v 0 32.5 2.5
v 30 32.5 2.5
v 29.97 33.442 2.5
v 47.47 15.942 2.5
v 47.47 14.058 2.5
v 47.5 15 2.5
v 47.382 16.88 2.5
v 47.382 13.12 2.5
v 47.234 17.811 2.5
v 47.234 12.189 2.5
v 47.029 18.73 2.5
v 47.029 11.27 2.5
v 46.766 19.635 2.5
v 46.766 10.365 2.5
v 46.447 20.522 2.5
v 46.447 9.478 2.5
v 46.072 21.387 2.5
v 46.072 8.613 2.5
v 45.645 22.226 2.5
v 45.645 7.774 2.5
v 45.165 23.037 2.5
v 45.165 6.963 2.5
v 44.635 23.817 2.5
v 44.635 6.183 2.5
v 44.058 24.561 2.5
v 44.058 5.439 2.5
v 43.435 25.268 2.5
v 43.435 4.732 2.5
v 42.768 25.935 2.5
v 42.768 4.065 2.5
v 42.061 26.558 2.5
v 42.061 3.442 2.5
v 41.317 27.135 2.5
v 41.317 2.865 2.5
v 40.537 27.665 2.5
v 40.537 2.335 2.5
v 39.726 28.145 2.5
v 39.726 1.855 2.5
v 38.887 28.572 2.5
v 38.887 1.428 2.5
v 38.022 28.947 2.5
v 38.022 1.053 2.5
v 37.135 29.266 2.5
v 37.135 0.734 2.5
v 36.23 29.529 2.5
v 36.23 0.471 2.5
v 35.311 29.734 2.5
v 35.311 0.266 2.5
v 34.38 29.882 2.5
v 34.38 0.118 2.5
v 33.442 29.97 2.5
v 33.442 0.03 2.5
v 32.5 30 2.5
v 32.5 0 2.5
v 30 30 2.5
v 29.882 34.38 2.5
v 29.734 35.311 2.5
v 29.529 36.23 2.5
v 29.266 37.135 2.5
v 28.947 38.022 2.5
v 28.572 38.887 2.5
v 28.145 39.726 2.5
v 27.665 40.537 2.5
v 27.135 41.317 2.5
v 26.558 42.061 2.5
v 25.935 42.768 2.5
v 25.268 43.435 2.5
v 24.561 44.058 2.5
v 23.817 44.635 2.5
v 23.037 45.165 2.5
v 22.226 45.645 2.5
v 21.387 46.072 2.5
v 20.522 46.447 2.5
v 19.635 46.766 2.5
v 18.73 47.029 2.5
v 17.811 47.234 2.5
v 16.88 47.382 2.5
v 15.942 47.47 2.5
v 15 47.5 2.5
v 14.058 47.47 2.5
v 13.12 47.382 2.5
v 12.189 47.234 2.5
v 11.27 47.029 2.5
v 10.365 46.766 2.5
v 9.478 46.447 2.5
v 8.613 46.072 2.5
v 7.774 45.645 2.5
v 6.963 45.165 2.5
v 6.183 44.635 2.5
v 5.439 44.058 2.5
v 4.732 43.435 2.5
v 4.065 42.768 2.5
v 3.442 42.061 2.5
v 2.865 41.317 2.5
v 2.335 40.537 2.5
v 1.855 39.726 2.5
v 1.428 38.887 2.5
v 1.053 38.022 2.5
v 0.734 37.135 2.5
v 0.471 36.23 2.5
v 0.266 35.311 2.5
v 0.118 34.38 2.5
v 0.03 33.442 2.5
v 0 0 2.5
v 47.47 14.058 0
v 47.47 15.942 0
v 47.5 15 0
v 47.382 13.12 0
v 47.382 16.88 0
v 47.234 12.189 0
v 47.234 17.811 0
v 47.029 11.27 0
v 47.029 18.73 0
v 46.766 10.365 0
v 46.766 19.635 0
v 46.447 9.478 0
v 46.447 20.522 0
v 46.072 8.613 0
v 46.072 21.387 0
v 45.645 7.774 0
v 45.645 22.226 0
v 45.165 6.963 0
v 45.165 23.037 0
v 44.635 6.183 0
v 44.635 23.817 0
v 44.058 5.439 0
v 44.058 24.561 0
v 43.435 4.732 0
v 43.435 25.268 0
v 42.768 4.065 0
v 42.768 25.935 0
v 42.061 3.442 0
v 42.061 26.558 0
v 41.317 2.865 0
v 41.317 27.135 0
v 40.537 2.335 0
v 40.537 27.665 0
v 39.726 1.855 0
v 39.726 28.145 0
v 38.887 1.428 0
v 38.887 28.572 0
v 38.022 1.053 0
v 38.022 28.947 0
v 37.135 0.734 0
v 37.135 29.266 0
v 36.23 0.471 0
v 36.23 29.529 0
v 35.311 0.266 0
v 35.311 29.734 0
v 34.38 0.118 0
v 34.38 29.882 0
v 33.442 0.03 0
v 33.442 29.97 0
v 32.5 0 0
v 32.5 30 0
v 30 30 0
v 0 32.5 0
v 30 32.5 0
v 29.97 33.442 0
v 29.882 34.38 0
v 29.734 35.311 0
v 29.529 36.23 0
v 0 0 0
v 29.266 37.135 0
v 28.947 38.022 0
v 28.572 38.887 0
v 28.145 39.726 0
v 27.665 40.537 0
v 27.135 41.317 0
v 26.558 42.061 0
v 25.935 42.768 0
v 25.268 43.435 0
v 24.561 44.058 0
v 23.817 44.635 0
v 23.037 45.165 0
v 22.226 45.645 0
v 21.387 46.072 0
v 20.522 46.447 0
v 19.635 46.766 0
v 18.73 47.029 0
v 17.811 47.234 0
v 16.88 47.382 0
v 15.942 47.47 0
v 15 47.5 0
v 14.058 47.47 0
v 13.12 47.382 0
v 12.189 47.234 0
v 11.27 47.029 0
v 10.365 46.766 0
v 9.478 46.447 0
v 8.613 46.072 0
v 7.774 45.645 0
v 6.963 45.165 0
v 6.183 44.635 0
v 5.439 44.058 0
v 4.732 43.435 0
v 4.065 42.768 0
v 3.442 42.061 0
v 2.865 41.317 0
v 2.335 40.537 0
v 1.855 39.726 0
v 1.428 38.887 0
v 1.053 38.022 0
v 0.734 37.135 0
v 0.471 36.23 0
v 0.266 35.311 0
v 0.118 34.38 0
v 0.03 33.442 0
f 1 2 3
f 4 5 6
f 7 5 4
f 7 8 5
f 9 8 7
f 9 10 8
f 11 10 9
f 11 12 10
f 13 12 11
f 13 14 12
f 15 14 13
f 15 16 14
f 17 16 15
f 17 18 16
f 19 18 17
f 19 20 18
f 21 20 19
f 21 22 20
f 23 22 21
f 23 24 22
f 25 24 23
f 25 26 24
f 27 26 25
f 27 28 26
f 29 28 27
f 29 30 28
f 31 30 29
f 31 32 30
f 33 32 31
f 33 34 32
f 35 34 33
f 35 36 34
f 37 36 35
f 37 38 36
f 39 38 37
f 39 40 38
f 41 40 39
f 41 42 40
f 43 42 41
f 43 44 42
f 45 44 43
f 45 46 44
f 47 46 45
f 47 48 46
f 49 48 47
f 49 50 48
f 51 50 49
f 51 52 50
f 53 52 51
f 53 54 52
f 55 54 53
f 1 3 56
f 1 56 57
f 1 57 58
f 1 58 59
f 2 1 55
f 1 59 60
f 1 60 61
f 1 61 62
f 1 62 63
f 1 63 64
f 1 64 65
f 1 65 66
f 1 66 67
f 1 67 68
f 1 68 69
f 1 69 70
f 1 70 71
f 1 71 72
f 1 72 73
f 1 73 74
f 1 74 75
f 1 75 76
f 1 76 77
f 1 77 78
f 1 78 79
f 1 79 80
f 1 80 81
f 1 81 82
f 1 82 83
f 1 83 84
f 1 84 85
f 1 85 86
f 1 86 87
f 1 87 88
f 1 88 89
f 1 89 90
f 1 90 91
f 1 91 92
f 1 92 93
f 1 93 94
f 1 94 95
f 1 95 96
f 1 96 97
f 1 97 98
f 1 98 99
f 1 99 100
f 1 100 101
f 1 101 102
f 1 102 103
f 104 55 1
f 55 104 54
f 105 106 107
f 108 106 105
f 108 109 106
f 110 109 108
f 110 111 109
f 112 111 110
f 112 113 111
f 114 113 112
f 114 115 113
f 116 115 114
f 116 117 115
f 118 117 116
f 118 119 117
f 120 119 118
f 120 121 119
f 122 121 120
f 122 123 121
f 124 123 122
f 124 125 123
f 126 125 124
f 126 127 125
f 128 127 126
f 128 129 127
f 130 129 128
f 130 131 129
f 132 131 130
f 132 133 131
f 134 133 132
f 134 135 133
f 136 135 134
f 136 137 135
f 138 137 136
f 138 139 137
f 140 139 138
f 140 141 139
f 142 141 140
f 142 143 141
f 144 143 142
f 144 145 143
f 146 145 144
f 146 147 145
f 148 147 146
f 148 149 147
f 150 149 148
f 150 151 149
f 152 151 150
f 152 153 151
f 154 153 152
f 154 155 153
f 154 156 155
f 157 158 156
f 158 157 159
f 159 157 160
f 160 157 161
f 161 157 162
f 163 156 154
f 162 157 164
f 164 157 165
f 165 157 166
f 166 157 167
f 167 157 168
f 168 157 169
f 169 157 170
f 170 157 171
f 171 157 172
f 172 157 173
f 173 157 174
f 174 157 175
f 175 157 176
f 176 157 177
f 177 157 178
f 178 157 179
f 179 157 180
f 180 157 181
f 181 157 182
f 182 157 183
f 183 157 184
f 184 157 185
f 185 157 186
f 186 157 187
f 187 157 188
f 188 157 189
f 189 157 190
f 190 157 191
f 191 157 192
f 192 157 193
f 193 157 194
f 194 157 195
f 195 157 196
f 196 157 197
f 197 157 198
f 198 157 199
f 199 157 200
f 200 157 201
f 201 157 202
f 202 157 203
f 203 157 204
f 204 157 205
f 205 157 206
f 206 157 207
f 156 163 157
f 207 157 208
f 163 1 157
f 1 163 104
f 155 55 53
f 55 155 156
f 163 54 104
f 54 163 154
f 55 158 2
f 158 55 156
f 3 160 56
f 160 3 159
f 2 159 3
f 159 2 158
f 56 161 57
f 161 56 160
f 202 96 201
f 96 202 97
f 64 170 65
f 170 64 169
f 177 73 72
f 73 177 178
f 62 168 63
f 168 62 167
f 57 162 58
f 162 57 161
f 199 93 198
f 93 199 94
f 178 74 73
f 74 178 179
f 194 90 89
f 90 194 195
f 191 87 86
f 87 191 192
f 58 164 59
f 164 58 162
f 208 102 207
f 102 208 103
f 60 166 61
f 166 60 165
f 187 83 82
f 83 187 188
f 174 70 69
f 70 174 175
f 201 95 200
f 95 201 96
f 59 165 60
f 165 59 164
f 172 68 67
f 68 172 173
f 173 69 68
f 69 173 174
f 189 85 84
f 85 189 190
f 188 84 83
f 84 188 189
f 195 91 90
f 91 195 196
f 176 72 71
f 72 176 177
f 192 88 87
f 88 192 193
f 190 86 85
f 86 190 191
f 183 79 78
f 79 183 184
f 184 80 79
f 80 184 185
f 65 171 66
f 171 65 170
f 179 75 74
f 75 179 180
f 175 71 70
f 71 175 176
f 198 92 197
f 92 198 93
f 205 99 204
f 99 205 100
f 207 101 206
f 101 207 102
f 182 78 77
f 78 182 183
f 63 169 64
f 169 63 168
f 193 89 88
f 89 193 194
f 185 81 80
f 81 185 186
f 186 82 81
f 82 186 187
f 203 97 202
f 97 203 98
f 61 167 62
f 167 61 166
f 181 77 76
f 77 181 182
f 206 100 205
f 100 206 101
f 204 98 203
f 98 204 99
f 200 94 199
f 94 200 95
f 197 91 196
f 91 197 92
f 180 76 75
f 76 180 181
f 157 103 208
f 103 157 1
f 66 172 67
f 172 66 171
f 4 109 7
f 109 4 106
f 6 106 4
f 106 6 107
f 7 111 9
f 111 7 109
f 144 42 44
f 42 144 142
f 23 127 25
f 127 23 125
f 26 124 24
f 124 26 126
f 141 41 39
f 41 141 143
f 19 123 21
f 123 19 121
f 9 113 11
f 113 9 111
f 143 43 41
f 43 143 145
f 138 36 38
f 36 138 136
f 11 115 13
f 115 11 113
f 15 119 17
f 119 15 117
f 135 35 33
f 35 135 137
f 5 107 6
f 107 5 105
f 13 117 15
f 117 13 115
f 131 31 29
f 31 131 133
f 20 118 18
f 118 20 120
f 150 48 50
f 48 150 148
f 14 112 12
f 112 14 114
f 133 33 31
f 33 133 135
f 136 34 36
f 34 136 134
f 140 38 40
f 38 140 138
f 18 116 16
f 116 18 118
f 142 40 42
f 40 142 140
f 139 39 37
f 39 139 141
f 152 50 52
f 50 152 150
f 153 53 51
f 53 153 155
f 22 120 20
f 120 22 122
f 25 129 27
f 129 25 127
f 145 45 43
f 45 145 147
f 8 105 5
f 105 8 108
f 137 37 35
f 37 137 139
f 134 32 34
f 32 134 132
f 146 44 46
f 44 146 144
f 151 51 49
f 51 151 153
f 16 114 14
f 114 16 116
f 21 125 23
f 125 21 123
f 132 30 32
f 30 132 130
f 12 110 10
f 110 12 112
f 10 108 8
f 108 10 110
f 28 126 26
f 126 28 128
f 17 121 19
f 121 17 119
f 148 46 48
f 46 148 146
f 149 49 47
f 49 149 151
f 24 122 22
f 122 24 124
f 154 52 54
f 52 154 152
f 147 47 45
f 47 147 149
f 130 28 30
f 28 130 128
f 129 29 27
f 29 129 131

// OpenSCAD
sidelength = 35;
shelfheight = 5;
wallthick = 2.5;
ringheight = 5;
ringOD = 10;
ringID = 3;
fnval = 100;
*translate([wallthick,wallthick+1,wallthick]) powercell();
*translate([wallthick,wallthick+1,wallthick]) battery();
*translate([wallthick,wallthick+1,wallthick]) promini();

*rotate([0,90,0]) button();

 heartshelforig();
module powercell() {
    color([1,0,0]) cube([26.16,24.13,1]);
}
module battery() {
    color([0,0,0]) cube([25,35,5]);
}

module promini() {
    color([0,0,1]) cube([42,18,.8]);
}

module button() { 
    cylinder([wallthick,6.8,6.8],$fn=fnval);
}

module support(l, w, h) {
       polyhedron(points=[
               [0,0,h],           // 0    front top corner
               [w,0,h],[0,0,0],   // 1, 2 front left & right bottom corners
               [0,l,h],           // 3    back top corner
               [w,l,h],[0,l,0]    // 4, 5 back left & right bottom corners
       ], faces=[ // points for all faces must be ordered clockwise when looking in
               [0,2,1],    // top face
               [3,4,5],    // base face
               [0,1,4,3],  // h face
               [1,2,5,4],  // w face
               [0,3,5,2],  // hypotenuse face
       ]);
}

module prismorig(l, w, h) {
       polyhedron(points=[
               [0,0,h],           // 0    front top corner
               [0,0,0],[w,0,0],   // 1, 2 front left & right bottom corners
               [0,l,h],           // 3    back top corner
               [0,l,0],[w,l,0]    // 4, 5 back left & right bottom corners
       ], faces=[ // points for all faces must be ordered clockwise when looking in
               [0,2,1],    // top face
               [3,4,5],    // base face
               [0,1,4,3],  // h face
               [1,2,5,4],  // w face
               [0,3,5,2],  // hypotenuse face
       ]);
}

 module heartshelf() {
     union() {
        shortside = sidelength-wallthick*2;
        cube([shortside,shortside,maxheight-wallthick]);
        translate([0,shortside,0]) cube([shortside,wallthick,maxheight-wallthick]);
        translate([shortside,0,0]) cube([wallthick,shortside,maxheight-wallthick]);
        translate([shortside/2,shortside+wallthick*2,0]) cylinder(maxheight-wallthick,shortside/2,shortside/2,false,$fn=fnval);
        translate([shortside+wallthick*2,shortside/2,0]) cylinder(maxheight-wallthick,shortside/2,shortside/2,false,$fn=fnval);
    }
}

 module heartshelforig() {
    translate([-wallthick,-wallthick,0]) union() {
        shortside = sidelength-wallthick*2;
        translate([wallthick,wallthick,0]) cube([shortside,shortside,shelfheight-wallthick]);
        translate([wallthick,sidelength-wallthick,0]) cube([shortside,wallthick,shelfheight-wallthick]);
        translate([sidelength-wallthick,wallthick,0]) cube([wallthick,shortside,shelfheight-wallthick]);
        translate([wallthick+shortside/2,shortside+wallthick*2,0]) cylinder(shelfheight-wallthick,shortside/2,shortside/2,false,$fn=fnval);
        translate([shortside+wallthick*2,wallthick+shortside/2,0]) cylinder(shelfheight-wallthick,shortside/2,shortside/2,false,$fn=fnval);
    }
}
